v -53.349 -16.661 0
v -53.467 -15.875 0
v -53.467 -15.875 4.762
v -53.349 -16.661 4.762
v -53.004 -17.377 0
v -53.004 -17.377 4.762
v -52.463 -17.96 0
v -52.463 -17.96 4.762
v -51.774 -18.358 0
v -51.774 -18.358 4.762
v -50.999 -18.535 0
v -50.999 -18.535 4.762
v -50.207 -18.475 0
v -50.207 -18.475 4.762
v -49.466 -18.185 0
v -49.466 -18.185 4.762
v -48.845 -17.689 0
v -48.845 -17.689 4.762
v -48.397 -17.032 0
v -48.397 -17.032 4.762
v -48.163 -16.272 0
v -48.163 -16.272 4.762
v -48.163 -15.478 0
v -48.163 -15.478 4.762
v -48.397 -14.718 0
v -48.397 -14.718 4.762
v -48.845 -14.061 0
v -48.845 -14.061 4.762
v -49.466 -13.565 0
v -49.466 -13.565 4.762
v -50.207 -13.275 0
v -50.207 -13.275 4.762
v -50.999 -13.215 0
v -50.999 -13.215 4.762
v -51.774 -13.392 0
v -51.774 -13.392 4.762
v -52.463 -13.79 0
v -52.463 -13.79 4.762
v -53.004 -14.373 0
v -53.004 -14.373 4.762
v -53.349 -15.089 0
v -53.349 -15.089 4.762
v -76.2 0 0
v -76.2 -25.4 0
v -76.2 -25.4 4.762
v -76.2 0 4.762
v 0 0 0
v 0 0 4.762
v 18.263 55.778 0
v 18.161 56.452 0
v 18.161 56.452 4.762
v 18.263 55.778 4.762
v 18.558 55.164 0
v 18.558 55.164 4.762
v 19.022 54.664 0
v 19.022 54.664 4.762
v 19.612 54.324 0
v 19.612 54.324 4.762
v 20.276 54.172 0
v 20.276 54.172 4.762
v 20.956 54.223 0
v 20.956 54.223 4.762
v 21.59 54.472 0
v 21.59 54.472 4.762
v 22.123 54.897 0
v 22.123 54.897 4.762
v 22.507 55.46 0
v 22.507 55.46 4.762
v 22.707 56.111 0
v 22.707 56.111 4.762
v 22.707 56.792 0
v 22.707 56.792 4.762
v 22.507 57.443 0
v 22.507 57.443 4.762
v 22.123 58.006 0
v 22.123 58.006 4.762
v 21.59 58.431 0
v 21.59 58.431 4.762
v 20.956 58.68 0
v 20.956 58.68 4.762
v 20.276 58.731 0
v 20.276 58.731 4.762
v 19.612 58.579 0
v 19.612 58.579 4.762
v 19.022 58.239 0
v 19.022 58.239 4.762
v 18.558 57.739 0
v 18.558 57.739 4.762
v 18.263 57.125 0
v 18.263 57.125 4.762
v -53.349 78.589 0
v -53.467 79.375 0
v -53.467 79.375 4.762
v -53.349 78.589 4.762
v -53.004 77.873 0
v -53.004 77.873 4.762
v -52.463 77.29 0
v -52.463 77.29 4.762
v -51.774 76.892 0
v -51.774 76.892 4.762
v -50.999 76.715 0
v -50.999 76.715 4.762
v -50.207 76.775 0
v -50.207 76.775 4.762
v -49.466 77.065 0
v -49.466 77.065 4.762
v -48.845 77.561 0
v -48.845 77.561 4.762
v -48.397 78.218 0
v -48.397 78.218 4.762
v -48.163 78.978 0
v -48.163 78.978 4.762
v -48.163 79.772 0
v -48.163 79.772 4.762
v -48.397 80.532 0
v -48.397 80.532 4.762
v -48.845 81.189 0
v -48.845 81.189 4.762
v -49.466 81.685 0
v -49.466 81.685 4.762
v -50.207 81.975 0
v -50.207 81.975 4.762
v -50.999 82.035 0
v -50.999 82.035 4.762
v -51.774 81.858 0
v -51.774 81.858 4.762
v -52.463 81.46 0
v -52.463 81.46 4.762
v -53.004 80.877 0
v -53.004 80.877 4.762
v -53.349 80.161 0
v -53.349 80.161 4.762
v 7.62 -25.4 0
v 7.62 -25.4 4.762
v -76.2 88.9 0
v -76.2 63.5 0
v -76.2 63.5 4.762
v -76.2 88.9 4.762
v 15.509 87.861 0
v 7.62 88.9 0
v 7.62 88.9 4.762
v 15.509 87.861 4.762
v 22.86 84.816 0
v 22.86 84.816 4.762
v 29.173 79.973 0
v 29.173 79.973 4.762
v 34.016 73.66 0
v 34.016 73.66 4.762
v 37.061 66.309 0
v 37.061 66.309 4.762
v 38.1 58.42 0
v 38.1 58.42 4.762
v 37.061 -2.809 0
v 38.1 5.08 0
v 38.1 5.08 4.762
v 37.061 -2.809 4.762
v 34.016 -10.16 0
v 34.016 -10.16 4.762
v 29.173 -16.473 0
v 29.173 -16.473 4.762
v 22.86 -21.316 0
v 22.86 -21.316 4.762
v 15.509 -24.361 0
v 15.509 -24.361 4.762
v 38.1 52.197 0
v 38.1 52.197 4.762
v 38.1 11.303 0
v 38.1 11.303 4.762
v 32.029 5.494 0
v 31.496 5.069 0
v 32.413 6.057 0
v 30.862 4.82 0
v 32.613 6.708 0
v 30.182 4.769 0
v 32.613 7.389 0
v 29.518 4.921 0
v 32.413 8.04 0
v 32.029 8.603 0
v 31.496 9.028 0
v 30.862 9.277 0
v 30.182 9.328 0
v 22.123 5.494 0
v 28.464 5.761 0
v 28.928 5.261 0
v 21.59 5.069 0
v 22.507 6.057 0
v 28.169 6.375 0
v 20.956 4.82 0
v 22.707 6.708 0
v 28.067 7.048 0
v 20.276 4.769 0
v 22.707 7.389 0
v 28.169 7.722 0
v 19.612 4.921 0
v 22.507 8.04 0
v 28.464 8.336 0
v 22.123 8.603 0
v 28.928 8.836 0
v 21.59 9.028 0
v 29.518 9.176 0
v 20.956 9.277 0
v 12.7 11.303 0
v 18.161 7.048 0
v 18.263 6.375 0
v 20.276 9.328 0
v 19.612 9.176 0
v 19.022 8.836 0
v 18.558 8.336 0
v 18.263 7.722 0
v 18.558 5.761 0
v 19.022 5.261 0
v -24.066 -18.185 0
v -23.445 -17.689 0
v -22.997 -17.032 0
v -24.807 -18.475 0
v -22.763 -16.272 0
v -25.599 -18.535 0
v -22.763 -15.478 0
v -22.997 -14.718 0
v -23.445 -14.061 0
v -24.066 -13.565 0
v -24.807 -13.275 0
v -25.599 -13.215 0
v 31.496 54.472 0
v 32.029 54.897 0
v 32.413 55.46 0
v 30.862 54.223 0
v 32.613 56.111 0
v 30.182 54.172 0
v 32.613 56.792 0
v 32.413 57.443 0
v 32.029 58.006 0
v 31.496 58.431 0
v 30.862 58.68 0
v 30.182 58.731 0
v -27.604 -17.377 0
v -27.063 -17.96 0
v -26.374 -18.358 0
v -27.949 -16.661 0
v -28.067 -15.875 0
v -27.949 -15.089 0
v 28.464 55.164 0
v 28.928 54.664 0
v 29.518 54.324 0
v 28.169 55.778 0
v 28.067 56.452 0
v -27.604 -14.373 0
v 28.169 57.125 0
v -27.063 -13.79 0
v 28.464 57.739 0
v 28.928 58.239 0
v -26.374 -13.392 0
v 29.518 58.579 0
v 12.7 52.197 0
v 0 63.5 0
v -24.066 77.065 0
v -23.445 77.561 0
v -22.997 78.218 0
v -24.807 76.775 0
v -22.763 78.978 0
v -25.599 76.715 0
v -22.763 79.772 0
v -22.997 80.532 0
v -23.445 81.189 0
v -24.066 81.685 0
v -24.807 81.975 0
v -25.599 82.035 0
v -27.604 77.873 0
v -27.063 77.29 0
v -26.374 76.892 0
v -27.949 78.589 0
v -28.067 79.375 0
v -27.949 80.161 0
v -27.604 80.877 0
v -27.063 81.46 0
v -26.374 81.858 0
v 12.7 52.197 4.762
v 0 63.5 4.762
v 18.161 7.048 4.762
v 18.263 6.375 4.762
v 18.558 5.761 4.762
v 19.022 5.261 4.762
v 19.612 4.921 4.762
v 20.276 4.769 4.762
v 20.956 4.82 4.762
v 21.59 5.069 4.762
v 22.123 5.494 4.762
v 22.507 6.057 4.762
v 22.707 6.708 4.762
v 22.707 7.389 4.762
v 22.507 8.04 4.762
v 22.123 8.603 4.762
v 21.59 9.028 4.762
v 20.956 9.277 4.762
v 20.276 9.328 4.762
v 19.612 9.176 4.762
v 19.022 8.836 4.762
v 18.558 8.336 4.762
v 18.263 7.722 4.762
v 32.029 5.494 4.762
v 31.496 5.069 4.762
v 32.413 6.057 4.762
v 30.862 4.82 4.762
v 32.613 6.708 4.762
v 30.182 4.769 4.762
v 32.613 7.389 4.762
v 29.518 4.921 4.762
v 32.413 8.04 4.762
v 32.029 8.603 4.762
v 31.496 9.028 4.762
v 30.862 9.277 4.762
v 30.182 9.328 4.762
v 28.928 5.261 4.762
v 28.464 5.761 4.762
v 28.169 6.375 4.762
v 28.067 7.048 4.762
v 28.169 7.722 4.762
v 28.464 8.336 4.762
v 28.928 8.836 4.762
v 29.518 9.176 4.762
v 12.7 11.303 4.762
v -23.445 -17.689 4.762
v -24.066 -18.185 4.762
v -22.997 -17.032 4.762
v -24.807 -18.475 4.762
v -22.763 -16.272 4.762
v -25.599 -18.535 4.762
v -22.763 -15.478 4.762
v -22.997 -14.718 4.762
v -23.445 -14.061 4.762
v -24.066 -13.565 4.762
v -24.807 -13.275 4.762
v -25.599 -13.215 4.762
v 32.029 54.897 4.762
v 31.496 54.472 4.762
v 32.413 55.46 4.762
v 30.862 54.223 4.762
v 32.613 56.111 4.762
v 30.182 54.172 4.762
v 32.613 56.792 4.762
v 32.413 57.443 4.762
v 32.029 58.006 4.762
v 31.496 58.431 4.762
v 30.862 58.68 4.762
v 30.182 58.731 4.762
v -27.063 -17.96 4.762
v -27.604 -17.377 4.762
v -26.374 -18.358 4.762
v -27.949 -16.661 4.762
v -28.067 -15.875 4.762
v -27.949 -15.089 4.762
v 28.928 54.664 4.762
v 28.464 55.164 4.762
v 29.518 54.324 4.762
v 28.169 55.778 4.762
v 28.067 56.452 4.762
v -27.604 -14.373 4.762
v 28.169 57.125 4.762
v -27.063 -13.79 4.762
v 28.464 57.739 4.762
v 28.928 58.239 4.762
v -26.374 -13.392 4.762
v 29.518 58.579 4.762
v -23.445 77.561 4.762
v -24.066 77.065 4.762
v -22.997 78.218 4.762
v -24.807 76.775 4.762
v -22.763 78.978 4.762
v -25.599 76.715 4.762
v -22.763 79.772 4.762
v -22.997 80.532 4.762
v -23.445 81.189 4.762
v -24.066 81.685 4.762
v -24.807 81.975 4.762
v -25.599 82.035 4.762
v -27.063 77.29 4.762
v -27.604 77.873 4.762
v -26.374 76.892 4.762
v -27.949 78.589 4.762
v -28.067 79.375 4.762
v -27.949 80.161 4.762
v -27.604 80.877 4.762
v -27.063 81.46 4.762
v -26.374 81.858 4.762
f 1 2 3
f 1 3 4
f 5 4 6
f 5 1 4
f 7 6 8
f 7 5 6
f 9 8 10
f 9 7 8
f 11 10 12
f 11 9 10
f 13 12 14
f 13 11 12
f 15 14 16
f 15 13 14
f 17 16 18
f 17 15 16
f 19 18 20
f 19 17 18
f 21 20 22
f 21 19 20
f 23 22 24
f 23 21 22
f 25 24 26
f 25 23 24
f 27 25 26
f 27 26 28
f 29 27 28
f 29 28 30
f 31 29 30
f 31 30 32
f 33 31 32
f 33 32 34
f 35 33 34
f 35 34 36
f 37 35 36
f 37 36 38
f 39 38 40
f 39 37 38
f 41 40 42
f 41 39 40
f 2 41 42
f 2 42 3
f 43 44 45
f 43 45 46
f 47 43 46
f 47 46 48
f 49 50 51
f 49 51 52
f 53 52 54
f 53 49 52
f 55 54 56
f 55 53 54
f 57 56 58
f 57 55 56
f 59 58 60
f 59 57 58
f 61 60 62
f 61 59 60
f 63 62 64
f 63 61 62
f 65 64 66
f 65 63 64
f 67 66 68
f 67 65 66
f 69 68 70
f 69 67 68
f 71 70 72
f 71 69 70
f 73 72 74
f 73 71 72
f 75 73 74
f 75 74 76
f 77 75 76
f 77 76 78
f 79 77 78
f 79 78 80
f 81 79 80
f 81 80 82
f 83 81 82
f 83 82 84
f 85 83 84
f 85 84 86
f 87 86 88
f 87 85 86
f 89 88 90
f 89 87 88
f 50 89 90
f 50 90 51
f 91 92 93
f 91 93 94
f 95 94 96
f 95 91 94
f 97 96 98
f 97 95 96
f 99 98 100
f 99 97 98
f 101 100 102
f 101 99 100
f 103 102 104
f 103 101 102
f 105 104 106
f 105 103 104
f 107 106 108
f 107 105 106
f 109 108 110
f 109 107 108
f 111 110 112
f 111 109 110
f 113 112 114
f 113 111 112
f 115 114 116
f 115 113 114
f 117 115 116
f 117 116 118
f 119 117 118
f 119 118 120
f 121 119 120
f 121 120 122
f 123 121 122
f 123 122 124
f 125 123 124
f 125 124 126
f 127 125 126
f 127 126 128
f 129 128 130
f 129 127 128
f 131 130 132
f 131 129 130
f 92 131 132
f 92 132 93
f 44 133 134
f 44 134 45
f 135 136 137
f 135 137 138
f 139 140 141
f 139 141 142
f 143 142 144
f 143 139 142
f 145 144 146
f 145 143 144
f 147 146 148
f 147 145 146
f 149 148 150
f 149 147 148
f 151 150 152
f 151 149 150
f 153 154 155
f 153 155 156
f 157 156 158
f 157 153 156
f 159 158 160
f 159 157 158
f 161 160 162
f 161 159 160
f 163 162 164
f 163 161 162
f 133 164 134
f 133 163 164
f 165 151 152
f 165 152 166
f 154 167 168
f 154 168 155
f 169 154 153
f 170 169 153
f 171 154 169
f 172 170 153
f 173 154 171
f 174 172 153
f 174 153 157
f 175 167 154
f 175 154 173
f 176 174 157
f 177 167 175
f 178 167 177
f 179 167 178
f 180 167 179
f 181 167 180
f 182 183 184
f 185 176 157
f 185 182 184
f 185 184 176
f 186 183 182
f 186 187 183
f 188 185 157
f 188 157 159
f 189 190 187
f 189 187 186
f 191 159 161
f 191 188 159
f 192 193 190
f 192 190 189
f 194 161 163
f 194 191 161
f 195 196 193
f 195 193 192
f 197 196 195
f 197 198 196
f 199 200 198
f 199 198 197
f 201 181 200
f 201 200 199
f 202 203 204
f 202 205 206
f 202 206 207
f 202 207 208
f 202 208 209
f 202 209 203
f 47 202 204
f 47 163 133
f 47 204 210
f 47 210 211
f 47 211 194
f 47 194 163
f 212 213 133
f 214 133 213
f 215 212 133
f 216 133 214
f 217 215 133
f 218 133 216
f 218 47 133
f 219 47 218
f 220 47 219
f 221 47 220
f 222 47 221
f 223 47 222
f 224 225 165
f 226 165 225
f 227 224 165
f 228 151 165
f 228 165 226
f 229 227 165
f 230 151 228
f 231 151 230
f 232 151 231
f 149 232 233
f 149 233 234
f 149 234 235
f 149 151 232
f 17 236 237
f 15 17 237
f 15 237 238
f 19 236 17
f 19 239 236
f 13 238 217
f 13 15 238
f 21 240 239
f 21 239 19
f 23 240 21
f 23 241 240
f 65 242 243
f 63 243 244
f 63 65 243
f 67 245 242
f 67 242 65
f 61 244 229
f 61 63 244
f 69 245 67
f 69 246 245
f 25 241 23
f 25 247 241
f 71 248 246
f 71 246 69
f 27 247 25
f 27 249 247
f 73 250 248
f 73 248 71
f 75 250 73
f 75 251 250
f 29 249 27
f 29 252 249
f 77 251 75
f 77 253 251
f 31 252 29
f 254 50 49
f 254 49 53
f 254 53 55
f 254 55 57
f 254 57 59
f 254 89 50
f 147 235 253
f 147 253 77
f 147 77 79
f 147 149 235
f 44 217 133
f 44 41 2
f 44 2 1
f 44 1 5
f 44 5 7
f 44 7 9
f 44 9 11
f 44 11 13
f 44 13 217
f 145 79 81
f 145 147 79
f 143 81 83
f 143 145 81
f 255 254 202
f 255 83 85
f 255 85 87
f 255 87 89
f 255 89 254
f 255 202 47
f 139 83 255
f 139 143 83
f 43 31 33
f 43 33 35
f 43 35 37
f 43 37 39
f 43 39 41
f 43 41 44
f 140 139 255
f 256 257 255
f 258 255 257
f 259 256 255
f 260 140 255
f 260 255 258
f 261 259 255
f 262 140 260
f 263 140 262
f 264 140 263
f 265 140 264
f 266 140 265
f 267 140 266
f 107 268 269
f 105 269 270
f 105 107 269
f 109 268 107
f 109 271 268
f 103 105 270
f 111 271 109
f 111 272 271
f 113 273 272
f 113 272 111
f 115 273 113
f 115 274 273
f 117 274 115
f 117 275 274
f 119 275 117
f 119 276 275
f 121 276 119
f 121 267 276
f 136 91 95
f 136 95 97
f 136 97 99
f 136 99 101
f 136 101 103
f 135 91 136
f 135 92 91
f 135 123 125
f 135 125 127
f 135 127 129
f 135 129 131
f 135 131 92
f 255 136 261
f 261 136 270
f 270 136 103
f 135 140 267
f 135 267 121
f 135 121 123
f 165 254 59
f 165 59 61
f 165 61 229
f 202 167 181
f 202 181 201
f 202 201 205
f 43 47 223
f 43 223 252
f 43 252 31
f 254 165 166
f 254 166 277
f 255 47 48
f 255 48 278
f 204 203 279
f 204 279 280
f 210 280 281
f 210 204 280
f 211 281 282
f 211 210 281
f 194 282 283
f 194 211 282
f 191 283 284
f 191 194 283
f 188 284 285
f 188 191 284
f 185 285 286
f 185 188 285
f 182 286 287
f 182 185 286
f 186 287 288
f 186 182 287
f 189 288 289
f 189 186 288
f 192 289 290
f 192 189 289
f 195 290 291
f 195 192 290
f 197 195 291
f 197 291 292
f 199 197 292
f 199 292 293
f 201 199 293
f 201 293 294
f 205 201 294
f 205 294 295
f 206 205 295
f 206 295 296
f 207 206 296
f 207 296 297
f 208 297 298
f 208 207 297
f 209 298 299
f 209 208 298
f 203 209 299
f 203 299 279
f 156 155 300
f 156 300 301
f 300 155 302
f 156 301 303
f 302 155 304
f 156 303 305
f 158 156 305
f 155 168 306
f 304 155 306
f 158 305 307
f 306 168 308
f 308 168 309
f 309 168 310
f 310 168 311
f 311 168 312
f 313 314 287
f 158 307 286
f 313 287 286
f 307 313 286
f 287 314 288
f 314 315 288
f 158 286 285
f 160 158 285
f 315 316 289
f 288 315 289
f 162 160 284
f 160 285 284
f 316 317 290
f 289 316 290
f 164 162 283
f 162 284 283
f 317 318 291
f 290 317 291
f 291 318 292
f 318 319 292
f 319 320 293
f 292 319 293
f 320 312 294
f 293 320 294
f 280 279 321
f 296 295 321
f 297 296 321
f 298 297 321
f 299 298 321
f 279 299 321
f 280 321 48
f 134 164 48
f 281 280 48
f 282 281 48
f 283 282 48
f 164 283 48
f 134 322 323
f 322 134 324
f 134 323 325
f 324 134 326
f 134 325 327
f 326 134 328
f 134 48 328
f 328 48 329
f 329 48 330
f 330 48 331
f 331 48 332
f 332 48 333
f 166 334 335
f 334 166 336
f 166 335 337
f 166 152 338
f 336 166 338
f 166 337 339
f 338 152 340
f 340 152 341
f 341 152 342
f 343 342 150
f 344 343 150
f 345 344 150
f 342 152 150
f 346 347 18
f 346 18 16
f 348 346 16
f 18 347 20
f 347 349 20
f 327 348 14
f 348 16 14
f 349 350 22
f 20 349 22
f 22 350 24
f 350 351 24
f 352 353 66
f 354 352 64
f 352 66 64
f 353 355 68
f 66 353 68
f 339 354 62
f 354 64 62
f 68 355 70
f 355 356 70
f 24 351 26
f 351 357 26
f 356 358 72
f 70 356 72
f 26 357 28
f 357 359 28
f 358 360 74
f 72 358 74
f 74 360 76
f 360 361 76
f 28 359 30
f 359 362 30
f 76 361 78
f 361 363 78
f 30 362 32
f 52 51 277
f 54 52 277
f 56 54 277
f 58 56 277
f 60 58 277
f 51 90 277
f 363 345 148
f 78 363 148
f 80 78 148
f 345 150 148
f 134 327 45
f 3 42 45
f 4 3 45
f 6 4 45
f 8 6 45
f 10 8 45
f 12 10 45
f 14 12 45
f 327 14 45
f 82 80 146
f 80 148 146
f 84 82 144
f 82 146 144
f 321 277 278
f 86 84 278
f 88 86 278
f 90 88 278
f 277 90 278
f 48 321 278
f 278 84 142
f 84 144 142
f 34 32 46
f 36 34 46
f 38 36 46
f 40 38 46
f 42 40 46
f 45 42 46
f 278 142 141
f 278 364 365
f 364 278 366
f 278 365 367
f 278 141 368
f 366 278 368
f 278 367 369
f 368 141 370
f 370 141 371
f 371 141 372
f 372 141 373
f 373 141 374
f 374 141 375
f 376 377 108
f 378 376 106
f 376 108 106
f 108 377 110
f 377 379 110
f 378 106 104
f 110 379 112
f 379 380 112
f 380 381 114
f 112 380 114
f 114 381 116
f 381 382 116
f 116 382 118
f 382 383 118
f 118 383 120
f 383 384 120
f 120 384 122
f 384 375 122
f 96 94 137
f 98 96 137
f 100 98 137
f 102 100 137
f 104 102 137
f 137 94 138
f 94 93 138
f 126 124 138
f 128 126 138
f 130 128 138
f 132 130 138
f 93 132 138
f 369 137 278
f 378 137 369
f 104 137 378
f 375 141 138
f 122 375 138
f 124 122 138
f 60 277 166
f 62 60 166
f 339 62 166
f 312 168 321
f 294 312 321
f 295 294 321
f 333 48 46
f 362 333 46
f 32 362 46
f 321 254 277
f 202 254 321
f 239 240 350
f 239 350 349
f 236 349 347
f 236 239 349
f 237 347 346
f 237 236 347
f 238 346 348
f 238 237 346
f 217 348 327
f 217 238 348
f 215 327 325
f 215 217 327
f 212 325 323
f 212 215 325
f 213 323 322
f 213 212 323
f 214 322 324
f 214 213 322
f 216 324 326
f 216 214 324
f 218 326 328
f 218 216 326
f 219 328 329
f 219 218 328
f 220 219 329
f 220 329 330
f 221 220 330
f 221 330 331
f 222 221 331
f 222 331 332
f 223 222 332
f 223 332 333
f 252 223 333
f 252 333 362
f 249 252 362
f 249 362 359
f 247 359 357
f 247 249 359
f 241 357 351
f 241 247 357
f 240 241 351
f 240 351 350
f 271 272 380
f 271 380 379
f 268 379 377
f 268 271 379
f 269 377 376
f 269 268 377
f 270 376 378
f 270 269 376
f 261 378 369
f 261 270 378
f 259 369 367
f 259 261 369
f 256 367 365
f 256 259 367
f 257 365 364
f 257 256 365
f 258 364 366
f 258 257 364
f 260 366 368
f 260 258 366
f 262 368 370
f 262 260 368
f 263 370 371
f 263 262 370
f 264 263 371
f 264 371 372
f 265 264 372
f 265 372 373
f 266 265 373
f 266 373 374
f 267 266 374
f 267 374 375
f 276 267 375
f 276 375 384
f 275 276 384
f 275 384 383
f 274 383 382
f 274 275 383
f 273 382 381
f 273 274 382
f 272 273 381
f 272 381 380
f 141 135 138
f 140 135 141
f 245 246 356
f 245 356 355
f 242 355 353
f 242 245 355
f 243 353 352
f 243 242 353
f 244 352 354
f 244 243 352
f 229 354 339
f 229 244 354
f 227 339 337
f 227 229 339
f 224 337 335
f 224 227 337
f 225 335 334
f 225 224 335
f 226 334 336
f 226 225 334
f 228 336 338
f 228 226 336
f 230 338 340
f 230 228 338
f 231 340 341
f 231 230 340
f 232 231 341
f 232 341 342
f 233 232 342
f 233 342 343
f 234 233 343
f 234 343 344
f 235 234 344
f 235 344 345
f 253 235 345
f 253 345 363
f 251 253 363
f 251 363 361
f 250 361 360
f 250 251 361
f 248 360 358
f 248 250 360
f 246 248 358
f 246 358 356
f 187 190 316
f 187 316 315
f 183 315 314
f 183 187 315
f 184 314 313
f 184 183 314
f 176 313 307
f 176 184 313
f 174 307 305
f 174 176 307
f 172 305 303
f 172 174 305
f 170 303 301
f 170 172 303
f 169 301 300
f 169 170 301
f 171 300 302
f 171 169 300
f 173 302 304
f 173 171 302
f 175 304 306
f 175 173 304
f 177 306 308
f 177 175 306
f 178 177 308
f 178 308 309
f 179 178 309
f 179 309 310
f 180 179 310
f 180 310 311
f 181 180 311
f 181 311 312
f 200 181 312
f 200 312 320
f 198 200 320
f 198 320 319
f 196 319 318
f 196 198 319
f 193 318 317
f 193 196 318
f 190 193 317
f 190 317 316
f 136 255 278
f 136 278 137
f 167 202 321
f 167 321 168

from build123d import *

# Parameters (mm, degrees)
SKETCH1_R           = 2.286
SKETCH1_R_2         = 2.667
BOSS_EXTRUDE1_DEPTH = 4.7625


with BuildPart() as part:
    # Sketch1 → Boss-Extrude1 (new body)
    with BuildSketch(Plane.XY):
        with BuildLine():
            Line((0, 0), (0, 63.5))
            Line((0, 63.5), (-76.2, 63.5))
            Line((-76.2, 63.5), (-76.2, 88.9))
            Line((-76.2, 88.9), (7.62, 88.9))
            ThreePointArc((7.62, 88.9), (29.172614691, 79.972614691), (38.1, 58.42))
            Line((38.1, 58.42), (38.1, 52.197))
            Line((38.1, 52.197), (12.7, 52.197))
            Line((12.7, 52.197), (12.7, 11.303))
            Line((12.7, 11.303), (38.1, 11.303))
            Line((38.1, 11.303), (38.1, 5.08))
            ThreePointArc((38.1, 5.08), (29.172614691, -16.472614691), (7.62, -25.4))
            Line((7.62, -25.4), (-76.2, -25.4))
            Line((-76.2, -25.4), (-76.2, 0))
            Line((-76.2, 0), (0, 0))
        make_face()
        with Locations(Location((20.447, 56.4515, 0), (0, 0, 180))):
            Circle(SKETCH1_R, mode=Mode.SUBTRACT)
        with Locations(Location((30.353, 56.4515, 0), (0, 0, 180))):
            Circle(SKETCH1_R, mode=Mode.SUBTRACT)
        with Locations(Location((20.447, 7.0485, 0), (0, 0, 180))):
            Circle(SKETCH1_R, mode=Mode.SUBTRACT)
        with Locations(Location((30.353, 7.0485, 0), (0, 0, 180))):
            Circle(SKETCH1_R, mode=Mode.SUBTRACT)
        with Locations(Location((-50.8, 79.375, 0), (0, 0, 180))):
            Circle(SKETCH1_R_2, mode=Mode.SUBTRACT)
        with Locations(Location((-25.4, 79.375, 0), (0, 0, 180))):
            Circle(SKETCH1_R_2, mode=Mode.SUBTRACT)
        with Locations(Location((-50.8, -15.875, 0), (0, 0, 180))):
            Circle(SKETCH1_R_2, mode=Mode.SUBTRACT)
        with Locations(Location((-25.4, -15.875, 0), (0, 0, 180))):
            Circle(SKETCH1_R_2, mode=Mode.SUBTRACT)
    extrude(amount=BOSS_EXTRUDE1_DEPTH)


solid = part.part
